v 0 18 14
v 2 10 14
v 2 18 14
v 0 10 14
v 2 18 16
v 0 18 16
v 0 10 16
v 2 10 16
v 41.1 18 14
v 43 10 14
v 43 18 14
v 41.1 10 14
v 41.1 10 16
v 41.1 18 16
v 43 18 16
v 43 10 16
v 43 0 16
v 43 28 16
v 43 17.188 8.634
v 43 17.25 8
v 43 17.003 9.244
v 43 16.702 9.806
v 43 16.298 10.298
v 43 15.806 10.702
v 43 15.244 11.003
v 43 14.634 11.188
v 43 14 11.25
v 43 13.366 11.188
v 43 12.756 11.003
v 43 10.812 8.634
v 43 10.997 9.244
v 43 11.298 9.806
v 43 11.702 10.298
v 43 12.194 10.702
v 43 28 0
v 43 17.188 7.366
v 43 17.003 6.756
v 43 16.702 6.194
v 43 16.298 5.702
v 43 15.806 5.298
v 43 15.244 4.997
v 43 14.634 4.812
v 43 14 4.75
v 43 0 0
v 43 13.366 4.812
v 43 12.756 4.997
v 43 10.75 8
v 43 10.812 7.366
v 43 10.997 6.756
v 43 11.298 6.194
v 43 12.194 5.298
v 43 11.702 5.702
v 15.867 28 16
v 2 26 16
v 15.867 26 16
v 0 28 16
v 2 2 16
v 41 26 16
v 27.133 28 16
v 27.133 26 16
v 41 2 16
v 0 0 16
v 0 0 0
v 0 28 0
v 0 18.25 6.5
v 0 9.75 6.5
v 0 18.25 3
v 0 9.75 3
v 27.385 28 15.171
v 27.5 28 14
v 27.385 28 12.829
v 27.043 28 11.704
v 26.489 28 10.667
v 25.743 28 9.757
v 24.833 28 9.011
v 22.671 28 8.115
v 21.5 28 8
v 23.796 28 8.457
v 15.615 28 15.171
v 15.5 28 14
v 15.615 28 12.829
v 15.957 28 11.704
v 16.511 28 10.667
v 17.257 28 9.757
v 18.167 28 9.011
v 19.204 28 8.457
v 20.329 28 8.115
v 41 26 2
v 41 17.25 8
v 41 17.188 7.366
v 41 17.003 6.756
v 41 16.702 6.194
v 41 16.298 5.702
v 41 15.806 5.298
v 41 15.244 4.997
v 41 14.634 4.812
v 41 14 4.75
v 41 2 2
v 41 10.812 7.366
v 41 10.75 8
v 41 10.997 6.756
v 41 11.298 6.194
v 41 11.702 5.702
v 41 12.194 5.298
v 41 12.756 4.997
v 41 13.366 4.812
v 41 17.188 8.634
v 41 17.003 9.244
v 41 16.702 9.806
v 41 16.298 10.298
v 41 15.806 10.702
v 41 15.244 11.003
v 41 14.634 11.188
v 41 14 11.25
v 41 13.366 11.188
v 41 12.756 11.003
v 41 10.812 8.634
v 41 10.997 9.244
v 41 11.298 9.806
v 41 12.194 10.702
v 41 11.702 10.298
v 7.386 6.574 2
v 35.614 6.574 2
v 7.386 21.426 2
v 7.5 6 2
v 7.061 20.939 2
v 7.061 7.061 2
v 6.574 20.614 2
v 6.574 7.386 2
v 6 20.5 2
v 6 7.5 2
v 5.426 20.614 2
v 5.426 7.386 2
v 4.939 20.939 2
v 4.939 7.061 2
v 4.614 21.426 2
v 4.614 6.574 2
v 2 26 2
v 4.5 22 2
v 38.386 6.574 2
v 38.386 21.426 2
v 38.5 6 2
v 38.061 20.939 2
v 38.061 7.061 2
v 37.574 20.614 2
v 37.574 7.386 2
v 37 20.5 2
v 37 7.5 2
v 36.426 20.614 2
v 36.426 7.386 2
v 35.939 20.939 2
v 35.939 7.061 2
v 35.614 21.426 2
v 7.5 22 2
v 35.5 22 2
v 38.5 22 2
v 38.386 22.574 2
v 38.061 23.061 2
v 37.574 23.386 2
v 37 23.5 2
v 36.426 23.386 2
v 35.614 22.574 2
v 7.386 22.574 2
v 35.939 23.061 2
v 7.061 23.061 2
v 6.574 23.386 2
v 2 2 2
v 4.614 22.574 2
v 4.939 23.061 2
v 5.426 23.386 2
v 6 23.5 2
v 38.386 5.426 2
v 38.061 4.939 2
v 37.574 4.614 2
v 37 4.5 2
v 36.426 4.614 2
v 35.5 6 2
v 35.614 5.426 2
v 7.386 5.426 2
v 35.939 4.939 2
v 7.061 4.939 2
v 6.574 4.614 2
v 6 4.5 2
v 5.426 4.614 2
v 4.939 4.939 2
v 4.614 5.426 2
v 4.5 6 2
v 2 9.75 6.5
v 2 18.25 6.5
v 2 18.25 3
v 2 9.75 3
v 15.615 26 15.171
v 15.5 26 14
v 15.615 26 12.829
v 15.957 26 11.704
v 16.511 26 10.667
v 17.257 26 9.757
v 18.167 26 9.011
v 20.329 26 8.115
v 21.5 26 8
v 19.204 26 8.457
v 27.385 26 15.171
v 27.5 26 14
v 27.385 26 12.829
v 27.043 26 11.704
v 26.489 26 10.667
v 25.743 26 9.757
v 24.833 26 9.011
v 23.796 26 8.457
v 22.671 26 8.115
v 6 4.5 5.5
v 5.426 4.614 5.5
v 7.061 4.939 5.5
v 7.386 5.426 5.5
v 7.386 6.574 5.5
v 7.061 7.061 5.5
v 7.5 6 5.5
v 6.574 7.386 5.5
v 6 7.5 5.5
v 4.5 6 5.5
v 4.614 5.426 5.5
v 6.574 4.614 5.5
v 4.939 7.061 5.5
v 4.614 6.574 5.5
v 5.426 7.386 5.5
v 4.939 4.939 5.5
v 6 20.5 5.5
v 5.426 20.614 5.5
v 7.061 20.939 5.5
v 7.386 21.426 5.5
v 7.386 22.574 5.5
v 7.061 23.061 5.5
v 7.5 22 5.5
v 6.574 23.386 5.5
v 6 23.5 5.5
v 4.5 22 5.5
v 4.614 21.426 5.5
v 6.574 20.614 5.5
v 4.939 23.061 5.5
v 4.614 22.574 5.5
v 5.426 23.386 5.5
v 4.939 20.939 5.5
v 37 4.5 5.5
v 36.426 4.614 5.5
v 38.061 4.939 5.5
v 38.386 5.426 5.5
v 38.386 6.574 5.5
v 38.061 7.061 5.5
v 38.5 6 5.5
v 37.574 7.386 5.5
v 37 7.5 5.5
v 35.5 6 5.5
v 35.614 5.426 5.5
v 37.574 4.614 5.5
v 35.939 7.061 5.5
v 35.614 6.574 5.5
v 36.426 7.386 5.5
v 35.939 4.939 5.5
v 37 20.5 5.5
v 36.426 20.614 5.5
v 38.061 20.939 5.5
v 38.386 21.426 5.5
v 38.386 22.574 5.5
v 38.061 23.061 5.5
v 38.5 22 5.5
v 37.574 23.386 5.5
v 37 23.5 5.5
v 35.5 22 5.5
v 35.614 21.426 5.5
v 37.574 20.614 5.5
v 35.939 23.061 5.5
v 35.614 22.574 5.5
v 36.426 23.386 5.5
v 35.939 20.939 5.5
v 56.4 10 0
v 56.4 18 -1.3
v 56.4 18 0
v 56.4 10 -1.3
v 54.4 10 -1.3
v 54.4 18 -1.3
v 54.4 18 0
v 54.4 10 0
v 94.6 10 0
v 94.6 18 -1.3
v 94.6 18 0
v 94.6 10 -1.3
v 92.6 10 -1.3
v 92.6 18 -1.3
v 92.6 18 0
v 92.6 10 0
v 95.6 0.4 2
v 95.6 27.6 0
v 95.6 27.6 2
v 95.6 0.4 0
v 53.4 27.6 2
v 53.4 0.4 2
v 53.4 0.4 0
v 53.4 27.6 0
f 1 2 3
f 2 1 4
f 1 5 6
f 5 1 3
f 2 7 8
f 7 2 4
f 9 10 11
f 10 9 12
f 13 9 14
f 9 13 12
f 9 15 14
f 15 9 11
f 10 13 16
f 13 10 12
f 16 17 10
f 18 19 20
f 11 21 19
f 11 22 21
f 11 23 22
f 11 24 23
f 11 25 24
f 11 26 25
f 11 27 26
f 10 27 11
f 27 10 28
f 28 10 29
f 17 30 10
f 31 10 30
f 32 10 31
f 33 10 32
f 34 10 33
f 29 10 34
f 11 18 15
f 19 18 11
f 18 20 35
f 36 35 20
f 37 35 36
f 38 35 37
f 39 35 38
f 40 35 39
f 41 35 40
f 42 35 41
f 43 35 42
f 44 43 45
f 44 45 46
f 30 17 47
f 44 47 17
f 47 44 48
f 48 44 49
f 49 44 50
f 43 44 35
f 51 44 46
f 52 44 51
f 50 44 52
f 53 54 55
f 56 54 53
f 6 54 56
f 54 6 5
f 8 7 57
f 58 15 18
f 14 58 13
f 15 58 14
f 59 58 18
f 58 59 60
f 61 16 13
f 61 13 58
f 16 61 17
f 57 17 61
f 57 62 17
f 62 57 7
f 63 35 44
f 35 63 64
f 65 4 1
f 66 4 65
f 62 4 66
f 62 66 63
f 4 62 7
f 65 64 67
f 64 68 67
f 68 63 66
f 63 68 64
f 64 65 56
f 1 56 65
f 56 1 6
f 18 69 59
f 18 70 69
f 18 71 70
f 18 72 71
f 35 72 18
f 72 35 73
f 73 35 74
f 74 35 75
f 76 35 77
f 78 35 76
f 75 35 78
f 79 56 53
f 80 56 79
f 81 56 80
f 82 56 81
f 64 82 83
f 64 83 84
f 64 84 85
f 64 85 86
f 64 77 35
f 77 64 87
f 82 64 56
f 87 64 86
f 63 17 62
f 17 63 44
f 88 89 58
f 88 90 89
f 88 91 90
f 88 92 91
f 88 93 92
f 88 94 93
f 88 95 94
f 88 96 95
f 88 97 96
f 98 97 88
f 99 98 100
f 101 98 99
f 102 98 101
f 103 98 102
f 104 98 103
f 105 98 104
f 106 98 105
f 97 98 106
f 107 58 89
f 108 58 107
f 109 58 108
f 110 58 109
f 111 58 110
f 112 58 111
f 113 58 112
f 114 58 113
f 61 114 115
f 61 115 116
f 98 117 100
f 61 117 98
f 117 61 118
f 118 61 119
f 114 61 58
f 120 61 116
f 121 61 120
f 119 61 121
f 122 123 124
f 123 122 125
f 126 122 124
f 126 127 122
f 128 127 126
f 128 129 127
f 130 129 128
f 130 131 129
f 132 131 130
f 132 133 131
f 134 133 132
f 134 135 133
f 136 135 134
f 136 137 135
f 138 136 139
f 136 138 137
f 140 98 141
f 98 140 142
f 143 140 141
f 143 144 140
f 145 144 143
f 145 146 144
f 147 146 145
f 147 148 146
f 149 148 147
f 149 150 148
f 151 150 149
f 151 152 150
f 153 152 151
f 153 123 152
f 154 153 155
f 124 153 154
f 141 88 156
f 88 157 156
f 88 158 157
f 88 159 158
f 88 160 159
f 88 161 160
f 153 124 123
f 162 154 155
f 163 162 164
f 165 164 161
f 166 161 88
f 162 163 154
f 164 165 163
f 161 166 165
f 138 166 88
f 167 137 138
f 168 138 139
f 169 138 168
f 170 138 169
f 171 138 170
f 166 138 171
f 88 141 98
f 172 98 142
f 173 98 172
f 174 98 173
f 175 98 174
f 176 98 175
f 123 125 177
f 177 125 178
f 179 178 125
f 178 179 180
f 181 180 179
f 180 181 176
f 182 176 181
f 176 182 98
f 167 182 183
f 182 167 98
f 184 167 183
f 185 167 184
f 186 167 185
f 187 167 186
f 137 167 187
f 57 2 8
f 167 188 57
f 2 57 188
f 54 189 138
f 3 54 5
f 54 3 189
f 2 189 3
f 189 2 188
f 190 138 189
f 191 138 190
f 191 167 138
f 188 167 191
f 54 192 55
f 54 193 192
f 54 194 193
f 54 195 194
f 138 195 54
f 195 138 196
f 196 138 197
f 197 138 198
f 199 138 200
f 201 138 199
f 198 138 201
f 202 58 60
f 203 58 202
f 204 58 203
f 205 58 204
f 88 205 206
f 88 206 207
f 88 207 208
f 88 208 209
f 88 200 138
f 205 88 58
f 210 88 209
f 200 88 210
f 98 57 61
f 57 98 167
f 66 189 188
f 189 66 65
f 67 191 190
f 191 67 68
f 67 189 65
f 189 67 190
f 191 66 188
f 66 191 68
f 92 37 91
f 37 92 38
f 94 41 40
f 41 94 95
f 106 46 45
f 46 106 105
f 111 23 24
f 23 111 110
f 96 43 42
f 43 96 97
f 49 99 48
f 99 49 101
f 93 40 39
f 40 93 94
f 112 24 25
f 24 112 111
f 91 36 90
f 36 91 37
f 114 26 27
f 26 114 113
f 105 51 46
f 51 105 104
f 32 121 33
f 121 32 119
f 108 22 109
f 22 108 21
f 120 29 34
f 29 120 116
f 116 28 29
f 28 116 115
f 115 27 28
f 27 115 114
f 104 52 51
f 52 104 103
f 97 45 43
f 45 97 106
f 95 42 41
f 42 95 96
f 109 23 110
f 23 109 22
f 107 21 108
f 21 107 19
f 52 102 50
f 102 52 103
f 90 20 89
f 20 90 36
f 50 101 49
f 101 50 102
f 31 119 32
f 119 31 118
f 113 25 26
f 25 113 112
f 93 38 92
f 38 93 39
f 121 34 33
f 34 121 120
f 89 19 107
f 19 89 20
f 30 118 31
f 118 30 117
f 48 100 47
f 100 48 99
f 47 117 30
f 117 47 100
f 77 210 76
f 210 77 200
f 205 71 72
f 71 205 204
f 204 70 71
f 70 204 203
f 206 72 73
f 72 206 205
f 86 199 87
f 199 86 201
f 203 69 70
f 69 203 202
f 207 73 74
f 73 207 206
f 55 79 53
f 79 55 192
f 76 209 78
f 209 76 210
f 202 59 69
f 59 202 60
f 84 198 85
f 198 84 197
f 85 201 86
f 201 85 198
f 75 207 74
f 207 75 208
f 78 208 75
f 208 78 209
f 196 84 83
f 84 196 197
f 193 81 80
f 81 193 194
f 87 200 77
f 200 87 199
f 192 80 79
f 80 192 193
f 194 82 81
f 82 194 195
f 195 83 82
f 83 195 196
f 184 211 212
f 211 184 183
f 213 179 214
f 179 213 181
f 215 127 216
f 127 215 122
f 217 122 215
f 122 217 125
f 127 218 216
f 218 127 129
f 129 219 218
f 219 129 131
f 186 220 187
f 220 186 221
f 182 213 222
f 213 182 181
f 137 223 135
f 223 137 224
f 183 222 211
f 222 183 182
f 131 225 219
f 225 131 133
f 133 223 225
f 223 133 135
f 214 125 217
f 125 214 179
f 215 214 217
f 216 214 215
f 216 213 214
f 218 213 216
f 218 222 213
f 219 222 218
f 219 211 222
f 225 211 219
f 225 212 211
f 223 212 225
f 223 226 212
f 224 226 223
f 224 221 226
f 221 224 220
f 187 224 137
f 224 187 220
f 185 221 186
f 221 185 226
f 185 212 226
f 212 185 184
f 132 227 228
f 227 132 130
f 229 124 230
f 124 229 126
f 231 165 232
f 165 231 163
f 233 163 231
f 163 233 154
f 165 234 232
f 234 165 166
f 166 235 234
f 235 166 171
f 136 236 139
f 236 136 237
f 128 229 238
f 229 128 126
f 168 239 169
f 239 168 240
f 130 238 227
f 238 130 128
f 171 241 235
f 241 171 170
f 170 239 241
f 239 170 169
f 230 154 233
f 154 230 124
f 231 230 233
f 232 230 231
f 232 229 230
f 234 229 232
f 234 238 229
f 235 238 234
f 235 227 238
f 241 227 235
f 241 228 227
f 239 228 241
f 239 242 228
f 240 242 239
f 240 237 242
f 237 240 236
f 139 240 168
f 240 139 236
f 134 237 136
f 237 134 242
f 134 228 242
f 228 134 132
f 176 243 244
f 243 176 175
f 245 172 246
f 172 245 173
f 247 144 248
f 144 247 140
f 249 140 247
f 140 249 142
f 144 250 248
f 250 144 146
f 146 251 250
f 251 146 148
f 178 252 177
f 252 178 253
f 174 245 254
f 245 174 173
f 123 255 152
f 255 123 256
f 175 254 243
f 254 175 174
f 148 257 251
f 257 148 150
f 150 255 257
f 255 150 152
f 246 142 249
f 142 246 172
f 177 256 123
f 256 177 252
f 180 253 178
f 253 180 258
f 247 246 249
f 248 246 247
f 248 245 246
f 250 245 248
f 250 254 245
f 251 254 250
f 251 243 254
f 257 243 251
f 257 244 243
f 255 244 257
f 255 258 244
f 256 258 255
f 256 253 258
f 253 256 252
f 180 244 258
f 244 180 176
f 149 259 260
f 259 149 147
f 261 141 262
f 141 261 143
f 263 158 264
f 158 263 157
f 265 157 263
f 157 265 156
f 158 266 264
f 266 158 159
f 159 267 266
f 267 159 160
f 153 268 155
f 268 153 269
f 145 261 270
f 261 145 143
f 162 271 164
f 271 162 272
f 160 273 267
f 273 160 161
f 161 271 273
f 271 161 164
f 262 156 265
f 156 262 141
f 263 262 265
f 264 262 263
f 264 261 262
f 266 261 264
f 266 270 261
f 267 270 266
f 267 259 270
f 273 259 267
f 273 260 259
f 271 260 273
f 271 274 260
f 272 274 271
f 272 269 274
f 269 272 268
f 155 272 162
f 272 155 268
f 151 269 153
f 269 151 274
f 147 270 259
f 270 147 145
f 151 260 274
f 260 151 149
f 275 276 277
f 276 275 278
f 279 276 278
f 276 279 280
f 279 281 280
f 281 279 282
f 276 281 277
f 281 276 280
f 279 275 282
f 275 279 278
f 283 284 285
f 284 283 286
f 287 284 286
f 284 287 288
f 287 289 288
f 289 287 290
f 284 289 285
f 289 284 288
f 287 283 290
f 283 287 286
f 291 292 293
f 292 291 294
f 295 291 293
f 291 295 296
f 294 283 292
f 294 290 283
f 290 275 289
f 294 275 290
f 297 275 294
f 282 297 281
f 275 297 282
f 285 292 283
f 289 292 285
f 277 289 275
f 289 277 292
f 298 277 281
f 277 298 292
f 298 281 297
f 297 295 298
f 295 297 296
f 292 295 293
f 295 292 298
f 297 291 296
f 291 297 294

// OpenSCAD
// Morse Trainer Keyer Enclosure
// =============================
// Parametric box sized for Arduino Pro Micro OR Raspberry Pi Zero.
// Set BOARD to "PROMICRO" or "PIZERO" to switch.
//
// Render to STL:
//   openscad -o keyer-box.stl keyer-box.scad
// Or open in OpenSCAD GUI to tweak.

/* [Board] */
BOARD       = "PROMICRO"; // [PROMICRO, PIZERO]

/* [Wall thickness] */
WALL        = 2.0;
LID_GAP     = 0.4;        // tolerance for snap-fit

/* [Internal padding around board] */
PAD_X       = 3;
PAD_Y       = 3;
PAD_TOP     = 8;          // headroom above board for headers/jack solder

/* [3.5 mm jack cutout] */
JACK_DIAM   = 6.5;
JACK_FROM_BOTTOM = 8;     // height above floor

/* [Piezo cutout (optional)] */
INCLUDE_PIEZO = true;
PIEZO_DIAM    = 12;

/* [Snap clips] */
CLIP_W      = 8;
CLIP_H      = 1.5;

/* ========================================================== */
// Board dimensions (mm)
PROMICRO_X = 33.0;  PROMICRO_Y = 18.0;  PROMICRO_Z = 6.0;   USB_W_PROMICRO = 8.5;  USB_H_PROMICRO = 3.5;
PIZERO_X   = 65.0;  PIZERO_Y   = 30.0;  PIZERO_Z   = 6.0;   USB_W_PIZERO   = 8.5;  USB_H_PIZERO   = 3.5;

board_x = (BOARD == "PIZERO") ? PIZERO_X : PROMICRO_X;
board_y = (BOARD == "PIZERO") ? PIZERO_Y : PROMICRO_Y;
board_z = (BOARD == "PIZERO") ? PIZERO_Z : PROMICRO_Z;
usb_w   = (BOARD == "PIZERO") ? USB_W_PIZERO : USB_W_PROMICRO;
usb_h   = (BOARD == "PIZERO") ? USB_H_PIZERO : USB_H_PROMICRO;

inner_x = board_x + 2 * PAD_X;
inner_y = board_y + 2 * PAD_Y;
inner_z = board_z + PAD_TOP;

outer_x = inner_x + 2 * WALL;
outer_y = inner_y + 2 * WALL;
outer_z = inner_z + WALL;        // floor only; lid is separate

/* ============================ Box body =================================== */
module box_body() {
    difference() {
        // outer shell
        cube([outer_x, outer_y, outer_z]);

        // hollow interior
        translate([WALL, WALL, WALL])
            cube([inner_x, inner_y, inner_z + 1]);

        // USB cutout on -X face, centered on board
        translate([-1, WALL + PAD_Y + (board_y - usb_w)/2, WALL + 1.0])
            cube([WALL + 2, usb_w, usb_h]);

        // 3.5 mm jack cutout on +X face
        translate([outer_x - WALL - 1, outer_y/2, JACK_FROM_BOTTOM])
            rotate([0, 90, 0])
                cylinder(h = WALL + 2, d = JACK_DIAM, $fn = 32);

        // Optional piezo cutout on +Y face
        if (INCLUDE_PIEZO) {
            translate([outer_x/2, outer_y - WALL - 1, JACK_FROM_BOTTOM + 6])
                rotate([-90, 0, 0])
                    cylinder(h = WALL + 2, d = PIEZO_DIAM, $fn = 32);
        }

        // Lid clip slots on +X and -X walls
        for (x = [-0.1, outer_x - WALL + 0.1]) {
            translate([x, (outer_y - CLIP_W)/2, outer_z - CLIP_H - 0.5])
                cube([WALL + 0.2, CLIP_W, CLIP_H + 0.6]);
        }
    }

    // Standoffs (4 corners) for board mounting
    standoff_h = WALL + 1.5;
    for (px = [WALL + PAD_X + 1, WALL + PAD_X + board_x - 1])
        for (py = [WALL + PAD_Y + 1, WALL + PAD_Y + board_y - 1])
            translate([px, py, WALL])
                cylinder(h = standoff_h, d = 3, $fn = 16);
}

/* ============================ Lid ======================================== */
module lid() {
    lid_x = outer_x - 2 * LID_GAP;
    lid_y = outer_y - 2 * LID_GAP;
    union() {
        // top plate
        translate([LID_GAP, LID_GAP, 0])
            cube([lid_x, lid_y, WALL]);

        // snap clips
        for (x_offset = [LID_GAP + WALL/2, LID_GAP + lid_x - WALL/2 - WALL])
            translate([x_offset, (outer_y - CLIP_W)/2, -CLIP_H + 0.2])
                cube([WALL, CLIP_W, CLIP_H]);
    }
}

/* ============================ Layout ===================================== */
// Print box and lid side by side.
box_body();
translate([outer_x + 10, 0, 0]) lid();
